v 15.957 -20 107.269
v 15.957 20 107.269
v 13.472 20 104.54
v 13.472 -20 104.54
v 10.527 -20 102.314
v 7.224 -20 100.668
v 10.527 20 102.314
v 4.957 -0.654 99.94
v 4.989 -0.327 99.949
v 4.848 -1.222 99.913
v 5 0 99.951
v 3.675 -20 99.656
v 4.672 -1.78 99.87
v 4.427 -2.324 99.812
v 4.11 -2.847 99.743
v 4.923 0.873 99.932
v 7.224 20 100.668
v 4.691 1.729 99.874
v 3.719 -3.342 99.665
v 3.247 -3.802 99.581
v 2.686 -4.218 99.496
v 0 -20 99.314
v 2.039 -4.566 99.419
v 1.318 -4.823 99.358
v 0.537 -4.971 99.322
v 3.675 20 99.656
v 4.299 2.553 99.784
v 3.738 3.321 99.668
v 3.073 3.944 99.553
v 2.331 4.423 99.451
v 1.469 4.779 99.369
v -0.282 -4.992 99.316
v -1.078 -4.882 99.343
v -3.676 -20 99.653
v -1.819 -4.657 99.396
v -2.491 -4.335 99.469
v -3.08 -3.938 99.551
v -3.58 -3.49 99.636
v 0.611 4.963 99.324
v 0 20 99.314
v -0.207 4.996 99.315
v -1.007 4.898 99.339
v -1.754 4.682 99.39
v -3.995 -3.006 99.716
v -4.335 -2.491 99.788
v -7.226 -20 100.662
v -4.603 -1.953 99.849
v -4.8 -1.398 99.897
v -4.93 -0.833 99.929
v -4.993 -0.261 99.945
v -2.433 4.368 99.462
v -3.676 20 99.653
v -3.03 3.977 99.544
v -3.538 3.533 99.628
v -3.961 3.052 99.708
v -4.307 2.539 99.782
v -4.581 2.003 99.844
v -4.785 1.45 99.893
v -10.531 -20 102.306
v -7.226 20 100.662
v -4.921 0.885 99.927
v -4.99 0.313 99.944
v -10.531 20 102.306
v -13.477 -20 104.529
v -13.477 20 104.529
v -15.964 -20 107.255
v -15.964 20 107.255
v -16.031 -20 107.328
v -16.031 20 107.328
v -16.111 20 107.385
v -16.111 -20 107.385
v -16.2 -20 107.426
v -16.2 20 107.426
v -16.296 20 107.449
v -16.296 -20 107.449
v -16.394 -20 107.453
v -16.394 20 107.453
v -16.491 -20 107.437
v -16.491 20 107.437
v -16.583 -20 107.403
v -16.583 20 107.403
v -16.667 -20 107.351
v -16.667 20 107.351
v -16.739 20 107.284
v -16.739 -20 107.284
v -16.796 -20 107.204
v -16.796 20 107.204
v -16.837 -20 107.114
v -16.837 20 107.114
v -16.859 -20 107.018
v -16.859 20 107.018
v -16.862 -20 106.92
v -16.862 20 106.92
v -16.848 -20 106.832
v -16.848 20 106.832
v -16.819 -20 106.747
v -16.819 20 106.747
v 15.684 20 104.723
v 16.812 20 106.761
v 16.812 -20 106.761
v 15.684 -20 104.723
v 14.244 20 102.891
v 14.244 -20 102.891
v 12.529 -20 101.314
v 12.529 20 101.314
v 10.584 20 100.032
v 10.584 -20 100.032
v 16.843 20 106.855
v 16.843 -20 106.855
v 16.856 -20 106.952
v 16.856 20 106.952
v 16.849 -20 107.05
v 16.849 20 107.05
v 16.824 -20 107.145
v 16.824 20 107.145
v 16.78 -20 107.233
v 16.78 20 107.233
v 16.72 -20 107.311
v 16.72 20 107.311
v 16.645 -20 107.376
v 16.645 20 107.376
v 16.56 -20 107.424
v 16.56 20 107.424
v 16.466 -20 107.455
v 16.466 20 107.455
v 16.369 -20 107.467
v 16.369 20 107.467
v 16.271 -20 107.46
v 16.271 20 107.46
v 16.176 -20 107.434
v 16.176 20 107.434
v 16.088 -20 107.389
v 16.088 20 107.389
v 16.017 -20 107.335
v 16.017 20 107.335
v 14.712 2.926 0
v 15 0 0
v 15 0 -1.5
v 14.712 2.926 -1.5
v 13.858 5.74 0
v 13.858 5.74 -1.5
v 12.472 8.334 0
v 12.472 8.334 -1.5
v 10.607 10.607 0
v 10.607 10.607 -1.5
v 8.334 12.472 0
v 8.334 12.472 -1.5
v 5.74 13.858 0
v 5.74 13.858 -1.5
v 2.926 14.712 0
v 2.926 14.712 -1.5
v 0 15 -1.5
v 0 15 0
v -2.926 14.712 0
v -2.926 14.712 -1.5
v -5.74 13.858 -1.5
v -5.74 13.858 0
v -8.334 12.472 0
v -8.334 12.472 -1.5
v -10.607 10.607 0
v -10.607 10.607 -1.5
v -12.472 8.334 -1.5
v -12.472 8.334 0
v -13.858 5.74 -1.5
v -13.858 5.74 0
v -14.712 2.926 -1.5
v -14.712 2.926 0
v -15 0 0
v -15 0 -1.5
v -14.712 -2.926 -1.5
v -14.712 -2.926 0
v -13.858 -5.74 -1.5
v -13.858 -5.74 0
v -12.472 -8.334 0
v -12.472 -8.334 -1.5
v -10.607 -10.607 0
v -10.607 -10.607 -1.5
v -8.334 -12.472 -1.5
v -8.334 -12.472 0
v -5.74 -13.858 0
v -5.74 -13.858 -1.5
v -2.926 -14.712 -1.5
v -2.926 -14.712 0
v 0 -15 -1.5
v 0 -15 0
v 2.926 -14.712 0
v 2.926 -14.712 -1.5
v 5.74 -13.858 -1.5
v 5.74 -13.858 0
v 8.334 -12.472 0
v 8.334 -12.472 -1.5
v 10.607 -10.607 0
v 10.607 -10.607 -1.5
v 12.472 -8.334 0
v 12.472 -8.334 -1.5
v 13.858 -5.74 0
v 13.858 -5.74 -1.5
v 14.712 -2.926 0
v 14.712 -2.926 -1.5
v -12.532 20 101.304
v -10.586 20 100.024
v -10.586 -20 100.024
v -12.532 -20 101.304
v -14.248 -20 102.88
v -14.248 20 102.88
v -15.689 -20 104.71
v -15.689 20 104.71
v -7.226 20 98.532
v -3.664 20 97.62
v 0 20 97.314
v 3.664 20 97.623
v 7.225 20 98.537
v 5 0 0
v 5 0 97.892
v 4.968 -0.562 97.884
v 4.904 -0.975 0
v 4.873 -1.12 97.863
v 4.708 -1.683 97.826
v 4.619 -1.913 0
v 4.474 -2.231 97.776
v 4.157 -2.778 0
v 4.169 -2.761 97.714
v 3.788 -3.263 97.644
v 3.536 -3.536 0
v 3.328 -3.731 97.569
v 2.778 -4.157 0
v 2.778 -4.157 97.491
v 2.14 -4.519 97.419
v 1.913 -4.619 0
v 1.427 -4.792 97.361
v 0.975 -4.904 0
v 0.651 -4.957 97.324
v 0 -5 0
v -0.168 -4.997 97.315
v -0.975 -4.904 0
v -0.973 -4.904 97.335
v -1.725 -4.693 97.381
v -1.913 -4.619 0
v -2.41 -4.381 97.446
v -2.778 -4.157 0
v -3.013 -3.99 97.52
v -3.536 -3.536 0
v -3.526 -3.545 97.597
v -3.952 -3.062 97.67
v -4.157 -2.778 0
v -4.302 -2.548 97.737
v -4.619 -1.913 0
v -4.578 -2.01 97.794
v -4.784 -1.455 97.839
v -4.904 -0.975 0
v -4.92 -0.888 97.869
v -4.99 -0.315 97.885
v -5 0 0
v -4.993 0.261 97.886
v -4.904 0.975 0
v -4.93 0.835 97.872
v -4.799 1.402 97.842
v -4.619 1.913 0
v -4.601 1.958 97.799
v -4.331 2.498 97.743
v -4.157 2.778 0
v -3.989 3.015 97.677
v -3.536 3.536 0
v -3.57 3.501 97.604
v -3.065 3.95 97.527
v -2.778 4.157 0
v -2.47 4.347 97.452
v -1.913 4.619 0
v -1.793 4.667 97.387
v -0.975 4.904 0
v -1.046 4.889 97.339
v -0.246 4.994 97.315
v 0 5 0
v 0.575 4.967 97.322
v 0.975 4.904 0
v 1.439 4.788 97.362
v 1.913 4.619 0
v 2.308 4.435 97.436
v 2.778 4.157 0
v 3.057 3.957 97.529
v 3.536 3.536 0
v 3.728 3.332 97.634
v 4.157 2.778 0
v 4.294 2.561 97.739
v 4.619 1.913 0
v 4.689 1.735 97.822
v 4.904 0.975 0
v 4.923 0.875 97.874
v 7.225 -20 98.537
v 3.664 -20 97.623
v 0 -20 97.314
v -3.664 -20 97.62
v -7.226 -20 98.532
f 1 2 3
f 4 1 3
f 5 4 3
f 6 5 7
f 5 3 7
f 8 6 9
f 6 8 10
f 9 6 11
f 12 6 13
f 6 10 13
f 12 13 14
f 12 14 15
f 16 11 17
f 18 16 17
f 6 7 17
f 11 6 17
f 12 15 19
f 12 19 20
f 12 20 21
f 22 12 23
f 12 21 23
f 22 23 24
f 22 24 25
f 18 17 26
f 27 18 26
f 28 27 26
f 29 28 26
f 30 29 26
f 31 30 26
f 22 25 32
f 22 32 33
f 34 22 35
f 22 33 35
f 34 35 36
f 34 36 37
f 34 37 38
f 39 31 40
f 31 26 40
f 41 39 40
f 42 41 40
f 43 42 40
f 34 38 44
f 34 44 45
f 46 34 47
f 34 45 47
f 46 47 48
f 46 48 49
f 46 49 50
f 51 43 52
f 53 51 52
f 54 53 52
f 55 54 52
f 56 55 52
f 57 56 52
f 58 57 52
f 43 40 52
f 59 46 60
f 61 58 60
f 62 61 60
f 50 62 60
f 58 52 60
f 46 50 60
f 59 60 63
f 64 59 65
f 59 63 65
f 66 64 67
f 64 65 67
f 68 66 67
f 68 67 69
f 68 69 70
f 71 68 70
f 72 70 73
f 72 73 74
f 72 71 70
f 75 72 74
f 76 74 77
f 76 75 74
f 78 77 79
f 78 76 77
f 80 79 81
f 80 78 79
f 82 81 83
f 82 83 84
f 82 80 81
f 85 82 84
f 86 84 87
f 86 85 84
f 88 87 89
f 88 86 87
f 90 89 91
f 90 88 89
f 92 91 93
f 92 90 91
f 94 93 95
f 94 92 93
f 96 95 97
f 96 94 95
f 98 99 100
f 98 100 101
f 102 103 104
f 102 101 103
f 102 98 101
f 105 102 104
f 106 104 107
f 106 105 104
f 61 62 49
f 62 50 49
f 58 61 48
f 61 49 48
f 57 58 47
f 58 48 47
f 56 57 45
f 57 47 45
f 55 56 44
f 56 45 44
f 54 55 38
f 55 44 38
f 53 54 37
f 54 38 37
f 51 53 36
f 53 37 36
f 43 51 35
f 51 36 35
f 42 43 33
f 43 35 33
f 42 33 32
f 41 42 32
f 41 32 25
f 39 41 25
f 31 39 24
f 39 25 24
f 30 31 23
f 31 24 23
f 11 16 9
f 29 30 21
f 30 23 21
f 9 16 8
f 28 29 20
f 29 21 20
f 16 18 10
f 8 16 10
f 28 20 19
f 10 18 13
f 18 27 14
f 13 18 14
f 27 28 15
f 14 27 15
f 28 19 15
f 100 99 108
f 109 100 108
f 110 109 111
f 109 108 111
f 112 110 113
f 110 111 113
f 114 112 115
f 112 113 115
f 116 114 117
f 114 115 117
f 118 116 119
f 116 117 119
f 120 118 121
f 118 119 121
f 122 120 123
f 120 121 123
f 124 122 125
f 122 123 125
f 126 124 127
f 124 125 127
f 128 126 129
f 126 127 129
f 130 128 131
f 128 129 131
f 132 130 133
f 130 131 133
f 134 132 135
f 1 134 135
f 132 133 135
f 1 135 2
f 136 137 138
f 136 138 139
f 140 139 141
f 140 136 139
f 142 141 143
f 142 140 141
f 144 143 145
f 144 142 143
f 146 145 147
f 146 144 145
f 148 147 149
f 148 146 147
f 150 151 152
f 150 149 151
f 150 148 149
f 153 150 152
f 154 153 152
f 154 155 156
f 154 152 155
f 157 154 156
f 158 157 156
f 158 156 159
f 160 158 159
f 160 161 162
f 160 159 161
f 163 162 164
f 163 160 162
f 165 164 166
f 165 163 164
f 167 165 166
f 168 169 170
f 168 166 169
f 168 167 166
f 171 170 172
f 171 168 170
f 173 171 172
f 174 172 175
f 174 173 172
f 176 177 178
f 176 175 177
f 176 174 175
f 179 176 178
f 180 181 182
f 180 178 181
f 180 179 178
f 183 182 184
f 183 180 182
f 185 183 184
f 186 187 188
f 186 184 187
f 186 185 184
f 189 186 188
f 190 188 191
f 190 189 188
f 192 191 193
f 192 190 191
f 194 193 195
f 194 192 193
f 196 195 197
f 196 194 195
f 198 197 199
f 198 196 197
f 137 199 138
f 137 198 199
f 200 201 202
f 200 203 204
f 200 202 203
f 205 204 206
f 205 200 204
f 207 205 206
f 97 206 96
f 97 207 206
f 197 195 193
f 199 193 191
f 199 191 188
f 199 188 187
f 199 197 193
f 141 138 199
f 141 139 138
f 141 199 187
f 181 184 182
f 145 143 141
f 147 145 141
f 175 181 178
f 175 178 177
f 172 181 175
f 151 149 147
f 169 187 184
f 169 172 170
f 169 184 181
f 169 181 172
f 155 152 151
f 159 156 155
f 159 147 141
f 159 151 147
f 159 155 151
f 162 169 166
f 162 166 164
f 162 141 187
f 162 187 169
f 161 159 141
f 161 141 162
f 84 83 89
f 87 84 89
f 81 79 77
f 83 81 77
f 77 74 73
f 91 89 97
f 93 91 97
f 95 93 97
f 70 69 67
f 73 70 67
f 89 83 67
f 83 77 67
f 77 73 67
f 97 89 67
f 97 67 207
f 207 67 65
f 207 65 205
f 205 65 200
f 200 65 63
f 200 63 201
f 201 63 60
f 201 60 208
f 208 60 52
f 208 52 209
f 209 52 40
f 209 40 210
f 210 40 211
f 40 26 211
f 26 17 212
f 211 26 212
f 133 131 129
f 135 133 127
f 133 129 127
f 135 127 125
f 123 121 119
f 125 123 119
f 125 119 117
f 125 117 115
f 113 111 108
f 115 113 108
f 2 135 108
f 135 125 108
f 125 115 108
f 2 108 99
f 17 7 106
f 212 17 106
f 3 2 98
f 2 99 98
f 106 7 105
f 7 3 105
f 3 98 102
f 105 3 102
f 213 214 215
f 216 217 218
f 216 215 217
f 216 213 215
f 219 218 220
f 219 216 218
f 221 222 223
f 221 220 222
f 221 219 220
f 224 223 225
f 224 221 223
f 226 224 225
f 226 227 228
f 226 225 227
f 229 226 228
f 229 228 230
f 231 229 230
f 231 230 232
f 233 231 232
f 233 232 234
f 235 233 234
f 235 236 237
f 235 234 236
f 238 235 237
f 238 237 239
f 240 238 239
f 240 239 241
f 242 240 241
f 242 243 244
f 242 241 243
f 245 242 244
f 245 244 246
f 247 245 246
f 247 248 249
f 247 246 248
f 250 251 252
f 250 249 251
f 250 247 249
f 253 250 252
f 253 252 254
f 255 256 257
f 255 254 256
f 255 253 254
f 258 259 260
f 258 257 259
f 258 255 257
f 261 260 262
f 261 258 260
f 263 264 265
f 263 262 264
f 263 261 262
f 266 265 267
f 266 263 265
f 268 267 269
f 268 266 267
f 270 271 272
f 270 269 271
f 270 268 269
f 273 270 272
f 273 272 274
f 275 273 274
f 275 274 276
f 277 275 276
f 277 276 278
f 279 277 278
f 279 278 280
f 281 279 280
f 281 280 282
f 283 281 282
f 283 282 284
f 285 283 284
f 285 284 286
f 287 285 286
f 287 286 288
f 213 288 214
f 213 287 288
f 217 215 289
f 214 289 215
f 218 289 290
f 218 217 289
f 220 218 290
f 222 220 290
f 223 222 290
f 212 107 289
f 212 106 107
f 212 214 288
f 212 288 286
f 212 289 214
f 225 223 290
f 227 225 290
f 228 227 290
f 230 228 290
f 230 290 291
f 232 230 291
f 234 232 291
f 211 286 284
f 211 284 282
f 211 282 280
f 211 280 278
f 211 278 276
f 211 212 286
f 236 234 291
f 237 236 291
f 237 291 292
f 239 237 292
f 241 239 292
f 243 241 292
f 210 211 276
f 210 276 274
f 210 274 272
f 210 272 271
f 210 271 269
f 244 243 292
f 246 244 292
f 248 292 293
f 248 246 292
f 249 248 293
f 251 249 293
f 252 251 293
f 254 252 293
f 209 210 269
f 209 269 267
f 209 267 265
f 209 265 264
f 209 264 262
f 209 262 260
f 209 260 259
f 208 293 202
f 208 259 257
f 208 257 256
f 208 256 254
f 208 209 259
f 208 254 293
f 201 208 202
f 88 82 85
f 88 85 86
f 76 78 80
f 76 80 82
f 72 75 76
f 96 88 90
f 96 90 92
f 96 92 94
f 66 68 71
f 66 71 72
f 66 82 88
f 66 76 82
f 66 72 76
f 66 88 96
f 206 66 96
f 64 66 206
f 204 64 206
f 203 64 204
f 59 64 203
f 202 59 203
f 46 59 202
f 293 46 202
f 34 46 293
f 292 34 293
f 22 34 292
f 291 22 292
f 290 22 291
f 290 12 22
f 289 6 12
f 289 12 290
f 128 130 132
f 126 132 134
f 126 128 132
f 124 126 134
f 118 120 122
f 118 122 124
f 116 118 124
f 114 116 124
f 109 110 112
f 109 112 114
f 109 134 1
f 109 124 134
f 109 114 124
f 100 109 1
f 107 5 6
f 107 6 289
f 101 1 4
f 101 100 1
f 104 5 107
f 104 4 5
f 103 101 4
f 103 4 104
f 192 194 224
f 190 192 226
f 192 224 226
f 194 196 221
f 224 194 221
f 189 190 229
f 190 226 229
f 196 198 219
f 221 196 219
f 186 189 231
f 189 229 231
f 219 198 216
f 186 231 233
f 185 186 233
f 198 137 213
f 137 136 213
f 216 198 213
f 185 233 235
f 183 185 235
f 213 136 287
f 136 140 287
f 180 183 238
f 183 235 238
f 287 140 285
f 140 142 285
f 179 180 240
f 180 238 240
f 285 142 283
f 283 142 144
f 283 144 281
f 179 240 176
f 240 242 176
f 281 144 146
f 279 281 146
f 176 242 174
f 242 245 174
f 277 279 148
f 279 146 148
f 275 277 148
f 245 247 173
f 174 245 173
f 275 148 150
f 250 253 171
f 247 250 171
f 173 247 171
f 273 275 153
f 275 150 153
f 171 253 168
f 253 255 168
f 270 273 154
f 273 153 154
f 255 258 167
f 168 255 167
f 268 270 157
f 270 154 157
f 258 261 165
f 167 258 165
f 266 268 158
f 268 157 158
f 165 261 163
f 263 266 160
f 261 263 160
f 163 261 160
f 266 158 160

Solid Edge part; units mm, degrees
sketch "Sketch1" plane through (0, 0, 0) normal (0, 0, 1) x (1, 0, 0)
  circle A0 centre (0, 0) radius 5
extrude "Protrusion1" add sketch "Sketch1" along normal blind 100
sketch "Sketch2" plane through (0, 0, 0) normal (0, 0, -1) x (1, 0, 0)
  circle A0 centre (0, 0) radius 15
extrude "ExtrudedProtrusion_2" add sketch "Sketch2" along normal blind 1.5
sketch "Sketch3" plane through (0, 0, 0) normal (0, -1, 0) x (1, 0, 0)
  arc A0 (18.9646, 112.9883) -> (-18.9764, 112.9719) centre (-0.0086, 119.3141) cw
  line L0 (-18.9764, 112.9719) -> (-17.3687, 108.1499)
  arc A1 (-17.3687, 108.1499) -> (-10.5859, 100.0237) centre (-3.616, 112.7352) ccw
  arc A2 (10.5838, 100.032) -> (-10.5859, 100.0237) centre (-0.0086, 119.3141) cw
  arc A3 (10.5838, 100.032) -> (17.3613, 108.1655) centre (3.6032, 112.7393) ccw
  line L1 (18.9646, 112.9883) -> (17.3613, 108.1655)
extrude "ExtrudedProtrusion_3" add sketch "Sketch3" along normal mid plane 40
sketch "Sketch4" plane through (-0.0059, -20, 105.1512) normal (0, -1, 0) x (0.3154721, 0, 0.9489349)
  arc A0 (13.4215, -15.5294) -> (1.4367, 20.469) centre (13.4388, 4.4706) cw
  line L0 (1.4367, 20.469) -> (5.9095, 22.7728)
  line L1 (5.9095, 22.7728) -> (18.5638, -15.5294)
  line L2 (18.5638, -15.5294) -> (13.4215, -15.5294)
extrude "ExtrudedCutout_1" cut sketch "Sketch4" against normal blind 62.9052
fillet "Round_1" radius 0.5 2 edges at (18.9646, 0, 112.9883) (-18.9764, 0, 112.9719)
